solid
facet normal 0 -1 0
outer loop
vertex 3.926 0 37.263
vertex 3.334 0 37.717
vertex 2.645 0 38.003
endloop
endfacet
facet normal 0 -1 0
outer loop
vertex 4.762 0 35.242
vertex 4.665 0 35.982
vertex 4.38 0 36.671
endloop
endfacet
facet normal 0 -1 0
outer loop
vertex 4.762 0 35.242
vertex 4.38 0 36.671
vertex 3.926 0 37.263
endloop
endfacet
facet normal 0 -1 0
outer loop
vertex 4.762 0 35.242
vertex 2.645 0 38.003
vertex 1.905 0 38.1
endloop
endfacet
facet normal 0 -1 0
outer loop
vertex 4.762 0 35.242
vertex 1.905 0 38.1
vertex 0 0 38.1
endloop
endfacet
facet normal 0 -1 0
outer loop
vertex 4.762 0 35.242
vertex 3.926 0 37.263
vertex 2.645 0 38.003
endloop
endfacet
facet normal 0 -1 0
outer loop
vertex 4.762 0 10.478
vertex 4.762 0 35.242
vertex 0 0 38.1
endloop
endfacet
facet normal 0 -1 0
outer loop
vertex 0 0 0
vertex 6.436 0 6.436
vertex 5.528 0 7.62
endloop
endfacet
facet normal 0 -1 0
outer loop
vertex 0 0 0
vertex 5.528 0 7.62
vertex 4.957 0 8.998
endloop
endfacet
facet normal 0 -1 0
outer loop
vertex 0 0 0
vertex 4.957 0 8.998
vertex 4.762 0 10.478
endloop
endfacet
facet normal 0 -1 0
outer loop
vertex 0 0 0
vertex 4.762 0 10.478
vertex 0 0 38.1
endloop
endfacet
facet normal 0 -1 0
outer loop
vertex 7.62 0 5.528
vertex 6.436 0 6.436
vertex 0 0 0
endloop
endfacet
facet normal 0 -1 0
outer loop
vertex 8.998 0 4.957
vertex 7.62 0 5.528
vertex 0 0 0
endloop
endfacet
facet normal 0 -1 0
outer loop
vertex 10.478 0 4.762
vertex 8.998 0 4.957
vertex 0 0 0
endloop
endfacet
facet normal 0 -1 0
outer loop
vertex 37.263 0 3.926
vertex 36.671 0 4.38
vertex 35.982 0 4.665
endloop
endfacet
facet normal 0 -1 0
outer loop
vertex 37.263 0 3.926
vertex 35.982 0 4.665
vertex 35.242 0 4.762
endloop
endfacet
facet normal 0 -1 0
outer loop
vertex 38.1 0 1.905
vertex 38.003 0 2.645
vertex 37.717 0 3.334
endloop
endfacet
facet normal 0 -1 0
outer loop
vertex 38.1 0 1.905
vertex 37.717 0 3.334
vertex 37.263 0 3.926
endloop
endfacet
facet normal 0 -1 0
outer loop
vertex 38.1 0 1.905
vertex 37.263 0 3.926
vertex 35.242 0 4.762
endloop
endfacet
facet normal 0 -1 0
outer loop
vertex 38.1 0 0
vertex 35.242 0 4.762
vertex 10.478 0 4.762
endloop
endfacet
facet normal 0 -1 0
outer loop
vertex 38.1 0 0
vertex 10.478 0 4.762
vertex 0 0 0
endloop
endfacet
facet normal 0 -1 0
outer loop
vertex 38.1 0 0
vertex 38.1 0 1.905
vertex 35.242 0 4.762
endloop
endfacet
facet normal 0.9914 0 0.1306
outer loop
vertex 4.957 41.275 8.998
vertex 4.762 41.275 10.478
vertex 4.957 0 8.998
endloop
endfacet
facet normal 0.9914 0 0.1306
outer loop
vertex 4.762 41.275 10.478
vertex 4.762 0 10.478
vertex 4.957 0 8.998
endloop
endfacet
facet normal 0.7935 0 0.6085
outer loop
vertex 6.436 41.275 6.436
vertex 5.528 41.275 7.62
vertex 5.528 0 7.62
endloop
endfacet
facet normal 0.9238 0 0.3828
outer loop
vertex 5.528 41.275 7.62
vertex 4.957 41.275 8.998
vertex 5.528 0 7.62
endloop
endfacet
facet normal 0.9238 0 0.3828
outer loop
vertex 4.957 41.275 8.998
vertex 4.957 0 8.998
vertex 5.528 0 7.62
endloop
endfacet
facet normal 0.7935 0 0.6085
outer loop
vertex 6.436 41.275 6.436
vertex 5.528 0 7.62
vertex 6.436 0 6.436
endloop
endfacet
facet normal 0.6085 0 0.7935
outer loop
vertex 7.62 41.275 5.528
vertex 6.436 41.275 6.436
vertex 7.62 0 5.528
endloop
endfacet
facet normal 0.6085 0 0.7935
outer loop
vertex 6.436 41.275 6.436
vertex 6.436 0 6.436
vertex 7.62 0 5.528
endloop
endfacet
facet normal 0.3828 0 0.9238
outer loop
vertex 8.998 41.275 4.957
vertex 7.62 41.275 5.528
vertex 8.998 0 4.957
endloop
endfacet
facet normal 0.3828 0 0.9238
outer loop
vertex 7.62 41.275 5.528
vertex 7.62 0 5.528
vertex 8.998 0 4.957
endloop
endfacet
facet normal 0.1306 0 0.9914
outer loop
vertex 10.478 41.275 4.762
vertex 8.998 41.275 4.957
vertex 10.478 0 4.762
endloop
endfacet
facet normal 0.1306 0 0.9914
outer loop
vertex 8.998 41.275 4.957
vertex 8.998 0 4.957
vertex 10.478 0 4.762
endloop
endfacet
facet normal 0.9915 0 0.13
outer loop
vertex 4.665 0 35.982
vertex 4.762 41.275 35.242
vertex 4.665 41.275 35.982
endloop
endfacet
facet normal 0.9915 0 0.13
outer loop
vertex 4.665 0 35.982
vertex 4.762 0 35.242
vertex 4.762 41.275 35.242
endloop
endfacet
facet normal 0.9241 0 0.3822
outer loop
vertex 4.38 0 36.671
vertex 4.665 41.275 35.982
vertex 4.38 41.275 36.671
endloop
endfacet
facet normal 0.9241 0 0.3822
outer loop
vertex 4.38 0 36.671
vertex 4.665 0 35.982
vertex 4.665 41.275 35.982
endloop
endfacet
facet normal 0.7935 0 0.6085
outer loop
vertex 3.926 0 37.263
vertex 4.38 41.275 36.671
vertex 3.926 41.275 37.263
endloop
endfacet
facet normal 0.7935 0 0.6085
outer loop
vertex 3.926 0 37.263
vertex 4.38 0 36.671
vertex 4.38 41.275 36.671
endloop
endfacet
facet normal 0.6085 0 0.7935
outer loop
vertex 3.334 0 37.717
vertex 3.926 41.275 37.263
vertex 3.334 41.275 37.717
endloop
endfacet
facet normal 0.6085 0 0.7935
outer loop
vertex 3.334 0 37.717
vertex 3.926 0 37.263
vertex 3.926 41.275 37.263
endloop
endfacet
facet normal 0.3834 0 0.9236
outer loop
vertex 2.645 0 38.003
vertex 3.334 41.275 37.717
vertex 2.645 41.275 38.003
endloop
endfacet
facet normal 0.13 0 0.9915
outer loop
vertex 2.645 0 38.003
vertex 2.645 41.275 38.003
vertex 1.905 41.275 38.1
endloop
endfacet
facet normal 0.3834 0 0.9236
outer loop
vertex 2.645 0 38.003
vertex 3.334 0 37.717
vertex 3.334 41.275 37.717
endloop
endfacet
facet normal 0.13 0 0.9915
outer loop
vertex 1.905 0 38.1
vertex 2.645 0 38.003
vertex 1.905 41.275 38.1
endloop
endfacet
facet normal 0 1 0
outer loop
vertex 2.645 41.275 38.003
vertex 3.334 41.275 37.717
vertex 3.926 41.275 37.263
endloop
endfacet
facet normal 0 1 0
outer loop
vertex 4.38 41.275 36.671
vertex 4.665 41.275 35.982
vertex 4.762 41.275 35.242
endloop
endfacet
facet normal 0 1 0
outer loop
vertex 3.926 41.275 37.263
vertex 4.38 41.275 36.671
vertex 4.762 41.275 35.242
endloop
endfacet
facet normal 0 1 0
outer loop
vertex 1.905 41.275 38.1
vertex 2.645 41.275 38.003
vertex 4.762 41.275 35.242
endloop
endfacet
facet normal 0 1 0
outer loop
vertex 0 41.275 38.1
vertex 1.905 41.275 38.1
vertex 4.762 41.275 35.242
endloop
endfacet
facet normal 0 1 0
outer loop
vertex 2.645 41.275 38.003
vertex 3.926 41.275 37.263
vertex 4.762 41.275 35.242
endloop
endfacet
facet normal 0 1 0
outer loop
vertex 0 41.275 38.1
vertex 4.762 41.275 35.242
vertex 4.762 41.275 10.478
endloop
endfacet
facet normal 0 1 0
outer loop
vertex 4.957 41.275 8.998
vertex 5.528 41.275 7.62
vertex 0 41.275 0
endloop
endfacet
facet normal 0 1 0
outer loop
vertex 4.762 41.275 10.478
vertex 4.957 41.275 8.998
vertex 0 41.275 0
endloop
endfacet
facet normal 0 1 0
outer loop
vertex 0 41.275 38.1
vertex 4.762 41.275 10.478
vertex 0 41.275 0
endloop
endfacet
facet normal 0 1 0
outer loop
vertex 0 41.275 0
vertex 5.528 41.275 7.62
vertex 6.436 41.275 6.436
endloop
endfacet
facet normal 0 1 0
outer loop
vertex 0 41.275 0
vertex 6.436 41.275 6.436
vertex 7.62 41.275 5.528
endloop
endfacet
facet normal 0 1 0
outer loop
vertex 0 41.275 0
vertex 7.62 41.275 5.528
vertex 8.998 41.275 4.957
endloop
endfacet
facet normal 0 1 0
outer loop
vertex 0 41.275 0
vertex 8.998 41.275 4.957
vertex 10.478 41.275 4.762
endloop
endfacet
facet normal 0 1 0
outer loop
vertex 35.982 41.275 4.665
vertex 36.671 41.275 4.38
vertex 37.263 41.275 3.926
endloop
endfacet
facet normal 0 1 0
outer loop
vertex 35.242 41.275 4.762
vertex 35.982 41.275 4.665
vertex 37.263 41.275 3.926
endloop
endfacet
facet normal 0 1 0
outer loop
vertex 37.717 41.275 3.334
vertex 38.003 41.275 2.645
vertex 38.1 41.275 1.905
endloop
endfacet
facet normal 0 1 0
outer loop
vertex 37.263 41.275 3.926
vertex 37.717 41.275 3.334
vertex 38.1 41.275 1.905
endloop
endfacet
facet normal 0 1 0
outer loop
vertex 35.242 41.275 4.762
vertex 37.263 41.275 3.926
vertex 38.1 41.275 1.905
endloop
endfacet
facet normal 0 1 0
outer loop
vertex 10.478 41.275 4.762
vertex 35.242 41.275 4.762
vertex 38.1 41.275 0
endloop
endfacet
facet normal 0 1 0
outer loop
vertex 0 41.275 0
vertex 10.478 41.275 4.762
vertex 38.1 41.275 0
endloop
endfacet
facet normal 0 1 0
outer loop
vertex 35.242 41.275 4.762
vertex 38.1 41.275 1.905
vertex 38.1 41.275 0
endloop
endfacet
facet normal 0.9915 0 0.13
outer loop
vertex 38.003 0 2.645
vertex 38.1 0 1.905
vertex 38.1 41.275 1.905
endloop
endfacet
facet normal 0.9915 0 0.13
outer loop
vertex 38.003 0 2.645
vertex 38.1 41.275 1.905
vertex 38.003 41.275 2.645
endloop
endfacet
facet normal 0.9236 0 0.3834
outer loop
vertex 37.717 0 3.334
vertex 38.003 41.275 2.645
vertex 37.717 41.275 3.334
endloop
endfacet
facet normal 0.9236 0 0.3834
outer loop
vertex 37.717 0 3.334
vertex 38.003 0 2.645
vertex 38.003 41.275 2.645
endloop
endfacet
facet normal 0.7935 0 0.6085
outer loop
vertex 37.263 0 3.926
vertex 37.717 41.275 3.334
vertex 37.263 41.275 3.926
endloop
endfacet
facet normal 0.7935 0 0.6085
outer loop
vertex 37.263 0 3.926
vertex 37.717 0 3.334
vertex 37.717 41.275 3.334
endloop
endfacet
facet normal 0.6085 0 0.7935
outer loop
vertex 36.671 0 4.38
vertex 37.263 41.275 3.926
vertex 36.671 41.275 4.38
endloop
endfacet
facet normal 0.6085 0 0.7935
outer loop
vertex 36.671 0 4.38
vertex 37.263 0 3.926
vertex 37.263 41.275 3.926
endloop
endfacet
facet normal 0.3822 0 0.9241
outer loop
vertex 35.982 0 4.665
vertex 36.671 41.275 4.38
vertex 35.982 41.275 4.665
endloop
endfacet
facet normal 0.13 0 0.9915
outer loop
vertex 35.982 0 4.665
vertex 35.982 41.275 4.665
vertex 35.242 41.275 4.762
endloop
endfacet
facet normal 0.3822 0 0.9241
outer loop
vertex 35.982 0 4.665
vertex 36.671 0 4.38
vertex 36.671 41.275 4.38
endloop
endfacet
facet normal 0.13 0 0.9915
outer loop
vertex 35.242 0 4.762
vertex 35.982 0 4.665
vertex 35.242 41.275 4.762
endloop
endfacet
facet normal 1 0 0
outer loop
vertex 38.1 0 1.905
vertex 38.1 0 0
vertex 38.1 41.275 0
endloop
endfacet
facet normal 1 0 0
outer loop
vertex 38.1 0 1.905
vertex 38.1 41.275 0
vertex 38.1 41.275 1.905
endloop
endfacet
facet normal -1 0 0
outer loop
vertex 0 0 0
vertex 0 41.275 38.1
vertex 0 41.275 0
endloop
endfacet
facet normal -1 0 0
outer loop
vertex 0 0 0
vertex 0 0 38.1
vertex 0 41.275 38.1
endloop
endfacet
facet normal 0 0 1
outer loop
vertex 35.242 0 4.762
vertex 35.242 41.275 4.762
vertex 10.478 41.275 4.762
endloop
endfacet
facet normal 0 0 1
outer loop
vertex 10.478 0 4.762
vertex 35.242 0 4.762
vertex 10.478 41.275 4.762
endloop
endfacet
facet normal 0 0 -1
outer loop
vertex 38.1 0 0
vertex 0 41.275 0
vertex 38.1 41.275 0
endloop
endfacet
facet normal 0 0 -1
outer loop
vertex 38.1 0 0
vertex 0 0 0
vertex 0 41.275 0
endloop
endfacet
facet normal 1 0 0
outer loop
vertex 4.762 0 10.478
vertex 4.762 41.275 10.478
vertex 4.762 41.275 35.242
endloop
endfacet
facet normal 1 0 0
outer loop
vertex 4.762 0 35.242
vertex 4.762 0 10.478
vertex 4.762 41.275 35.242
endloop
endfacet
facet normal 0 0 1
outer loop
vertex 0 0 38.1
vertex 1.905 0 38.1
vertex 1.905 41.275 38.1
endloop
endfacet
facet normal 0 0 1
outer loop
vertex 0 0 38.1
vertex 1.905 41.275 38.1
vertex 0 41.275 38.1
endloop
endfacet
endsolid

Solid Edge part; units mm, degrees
sketch "Sketch1" plane through (0, 0, 0) normal (0, -1, 0) x (1, 0, 0)
  line L0 (0, 38.1) -> (0, 0)
  line L1 (0, 0) -> (38.1, 0)
  line L2 (38.1, 0) -> (38.1, 1.905)
  arc A0 (38.1, 1.905) -> (35.2425, 4.7625) centre (35.2425, 1.905) ccw
  line L3 (35.2425, 4.7625) -> (10.4775, 4.7625)
  arc A1 (10.4775, 4.7625) -> (4.7625, 10.4775) centre (10.4775, 10.4775) cw
  line L4 (4.7625, 10.4775) -> (4.7625, 35.2425)
  arc A2 (4.7625, 35.2425) -> (1.905, 38.1) centre (1.905, 35.2425) ccw
  line L5 (1.905, 38.1) -> (0, 38.1)
  dimension "D1" = 38.1
  dimension "D2" = 38.1
extrude "Protrusion1" add sketch "Sketch1" against normal blind 41.275
